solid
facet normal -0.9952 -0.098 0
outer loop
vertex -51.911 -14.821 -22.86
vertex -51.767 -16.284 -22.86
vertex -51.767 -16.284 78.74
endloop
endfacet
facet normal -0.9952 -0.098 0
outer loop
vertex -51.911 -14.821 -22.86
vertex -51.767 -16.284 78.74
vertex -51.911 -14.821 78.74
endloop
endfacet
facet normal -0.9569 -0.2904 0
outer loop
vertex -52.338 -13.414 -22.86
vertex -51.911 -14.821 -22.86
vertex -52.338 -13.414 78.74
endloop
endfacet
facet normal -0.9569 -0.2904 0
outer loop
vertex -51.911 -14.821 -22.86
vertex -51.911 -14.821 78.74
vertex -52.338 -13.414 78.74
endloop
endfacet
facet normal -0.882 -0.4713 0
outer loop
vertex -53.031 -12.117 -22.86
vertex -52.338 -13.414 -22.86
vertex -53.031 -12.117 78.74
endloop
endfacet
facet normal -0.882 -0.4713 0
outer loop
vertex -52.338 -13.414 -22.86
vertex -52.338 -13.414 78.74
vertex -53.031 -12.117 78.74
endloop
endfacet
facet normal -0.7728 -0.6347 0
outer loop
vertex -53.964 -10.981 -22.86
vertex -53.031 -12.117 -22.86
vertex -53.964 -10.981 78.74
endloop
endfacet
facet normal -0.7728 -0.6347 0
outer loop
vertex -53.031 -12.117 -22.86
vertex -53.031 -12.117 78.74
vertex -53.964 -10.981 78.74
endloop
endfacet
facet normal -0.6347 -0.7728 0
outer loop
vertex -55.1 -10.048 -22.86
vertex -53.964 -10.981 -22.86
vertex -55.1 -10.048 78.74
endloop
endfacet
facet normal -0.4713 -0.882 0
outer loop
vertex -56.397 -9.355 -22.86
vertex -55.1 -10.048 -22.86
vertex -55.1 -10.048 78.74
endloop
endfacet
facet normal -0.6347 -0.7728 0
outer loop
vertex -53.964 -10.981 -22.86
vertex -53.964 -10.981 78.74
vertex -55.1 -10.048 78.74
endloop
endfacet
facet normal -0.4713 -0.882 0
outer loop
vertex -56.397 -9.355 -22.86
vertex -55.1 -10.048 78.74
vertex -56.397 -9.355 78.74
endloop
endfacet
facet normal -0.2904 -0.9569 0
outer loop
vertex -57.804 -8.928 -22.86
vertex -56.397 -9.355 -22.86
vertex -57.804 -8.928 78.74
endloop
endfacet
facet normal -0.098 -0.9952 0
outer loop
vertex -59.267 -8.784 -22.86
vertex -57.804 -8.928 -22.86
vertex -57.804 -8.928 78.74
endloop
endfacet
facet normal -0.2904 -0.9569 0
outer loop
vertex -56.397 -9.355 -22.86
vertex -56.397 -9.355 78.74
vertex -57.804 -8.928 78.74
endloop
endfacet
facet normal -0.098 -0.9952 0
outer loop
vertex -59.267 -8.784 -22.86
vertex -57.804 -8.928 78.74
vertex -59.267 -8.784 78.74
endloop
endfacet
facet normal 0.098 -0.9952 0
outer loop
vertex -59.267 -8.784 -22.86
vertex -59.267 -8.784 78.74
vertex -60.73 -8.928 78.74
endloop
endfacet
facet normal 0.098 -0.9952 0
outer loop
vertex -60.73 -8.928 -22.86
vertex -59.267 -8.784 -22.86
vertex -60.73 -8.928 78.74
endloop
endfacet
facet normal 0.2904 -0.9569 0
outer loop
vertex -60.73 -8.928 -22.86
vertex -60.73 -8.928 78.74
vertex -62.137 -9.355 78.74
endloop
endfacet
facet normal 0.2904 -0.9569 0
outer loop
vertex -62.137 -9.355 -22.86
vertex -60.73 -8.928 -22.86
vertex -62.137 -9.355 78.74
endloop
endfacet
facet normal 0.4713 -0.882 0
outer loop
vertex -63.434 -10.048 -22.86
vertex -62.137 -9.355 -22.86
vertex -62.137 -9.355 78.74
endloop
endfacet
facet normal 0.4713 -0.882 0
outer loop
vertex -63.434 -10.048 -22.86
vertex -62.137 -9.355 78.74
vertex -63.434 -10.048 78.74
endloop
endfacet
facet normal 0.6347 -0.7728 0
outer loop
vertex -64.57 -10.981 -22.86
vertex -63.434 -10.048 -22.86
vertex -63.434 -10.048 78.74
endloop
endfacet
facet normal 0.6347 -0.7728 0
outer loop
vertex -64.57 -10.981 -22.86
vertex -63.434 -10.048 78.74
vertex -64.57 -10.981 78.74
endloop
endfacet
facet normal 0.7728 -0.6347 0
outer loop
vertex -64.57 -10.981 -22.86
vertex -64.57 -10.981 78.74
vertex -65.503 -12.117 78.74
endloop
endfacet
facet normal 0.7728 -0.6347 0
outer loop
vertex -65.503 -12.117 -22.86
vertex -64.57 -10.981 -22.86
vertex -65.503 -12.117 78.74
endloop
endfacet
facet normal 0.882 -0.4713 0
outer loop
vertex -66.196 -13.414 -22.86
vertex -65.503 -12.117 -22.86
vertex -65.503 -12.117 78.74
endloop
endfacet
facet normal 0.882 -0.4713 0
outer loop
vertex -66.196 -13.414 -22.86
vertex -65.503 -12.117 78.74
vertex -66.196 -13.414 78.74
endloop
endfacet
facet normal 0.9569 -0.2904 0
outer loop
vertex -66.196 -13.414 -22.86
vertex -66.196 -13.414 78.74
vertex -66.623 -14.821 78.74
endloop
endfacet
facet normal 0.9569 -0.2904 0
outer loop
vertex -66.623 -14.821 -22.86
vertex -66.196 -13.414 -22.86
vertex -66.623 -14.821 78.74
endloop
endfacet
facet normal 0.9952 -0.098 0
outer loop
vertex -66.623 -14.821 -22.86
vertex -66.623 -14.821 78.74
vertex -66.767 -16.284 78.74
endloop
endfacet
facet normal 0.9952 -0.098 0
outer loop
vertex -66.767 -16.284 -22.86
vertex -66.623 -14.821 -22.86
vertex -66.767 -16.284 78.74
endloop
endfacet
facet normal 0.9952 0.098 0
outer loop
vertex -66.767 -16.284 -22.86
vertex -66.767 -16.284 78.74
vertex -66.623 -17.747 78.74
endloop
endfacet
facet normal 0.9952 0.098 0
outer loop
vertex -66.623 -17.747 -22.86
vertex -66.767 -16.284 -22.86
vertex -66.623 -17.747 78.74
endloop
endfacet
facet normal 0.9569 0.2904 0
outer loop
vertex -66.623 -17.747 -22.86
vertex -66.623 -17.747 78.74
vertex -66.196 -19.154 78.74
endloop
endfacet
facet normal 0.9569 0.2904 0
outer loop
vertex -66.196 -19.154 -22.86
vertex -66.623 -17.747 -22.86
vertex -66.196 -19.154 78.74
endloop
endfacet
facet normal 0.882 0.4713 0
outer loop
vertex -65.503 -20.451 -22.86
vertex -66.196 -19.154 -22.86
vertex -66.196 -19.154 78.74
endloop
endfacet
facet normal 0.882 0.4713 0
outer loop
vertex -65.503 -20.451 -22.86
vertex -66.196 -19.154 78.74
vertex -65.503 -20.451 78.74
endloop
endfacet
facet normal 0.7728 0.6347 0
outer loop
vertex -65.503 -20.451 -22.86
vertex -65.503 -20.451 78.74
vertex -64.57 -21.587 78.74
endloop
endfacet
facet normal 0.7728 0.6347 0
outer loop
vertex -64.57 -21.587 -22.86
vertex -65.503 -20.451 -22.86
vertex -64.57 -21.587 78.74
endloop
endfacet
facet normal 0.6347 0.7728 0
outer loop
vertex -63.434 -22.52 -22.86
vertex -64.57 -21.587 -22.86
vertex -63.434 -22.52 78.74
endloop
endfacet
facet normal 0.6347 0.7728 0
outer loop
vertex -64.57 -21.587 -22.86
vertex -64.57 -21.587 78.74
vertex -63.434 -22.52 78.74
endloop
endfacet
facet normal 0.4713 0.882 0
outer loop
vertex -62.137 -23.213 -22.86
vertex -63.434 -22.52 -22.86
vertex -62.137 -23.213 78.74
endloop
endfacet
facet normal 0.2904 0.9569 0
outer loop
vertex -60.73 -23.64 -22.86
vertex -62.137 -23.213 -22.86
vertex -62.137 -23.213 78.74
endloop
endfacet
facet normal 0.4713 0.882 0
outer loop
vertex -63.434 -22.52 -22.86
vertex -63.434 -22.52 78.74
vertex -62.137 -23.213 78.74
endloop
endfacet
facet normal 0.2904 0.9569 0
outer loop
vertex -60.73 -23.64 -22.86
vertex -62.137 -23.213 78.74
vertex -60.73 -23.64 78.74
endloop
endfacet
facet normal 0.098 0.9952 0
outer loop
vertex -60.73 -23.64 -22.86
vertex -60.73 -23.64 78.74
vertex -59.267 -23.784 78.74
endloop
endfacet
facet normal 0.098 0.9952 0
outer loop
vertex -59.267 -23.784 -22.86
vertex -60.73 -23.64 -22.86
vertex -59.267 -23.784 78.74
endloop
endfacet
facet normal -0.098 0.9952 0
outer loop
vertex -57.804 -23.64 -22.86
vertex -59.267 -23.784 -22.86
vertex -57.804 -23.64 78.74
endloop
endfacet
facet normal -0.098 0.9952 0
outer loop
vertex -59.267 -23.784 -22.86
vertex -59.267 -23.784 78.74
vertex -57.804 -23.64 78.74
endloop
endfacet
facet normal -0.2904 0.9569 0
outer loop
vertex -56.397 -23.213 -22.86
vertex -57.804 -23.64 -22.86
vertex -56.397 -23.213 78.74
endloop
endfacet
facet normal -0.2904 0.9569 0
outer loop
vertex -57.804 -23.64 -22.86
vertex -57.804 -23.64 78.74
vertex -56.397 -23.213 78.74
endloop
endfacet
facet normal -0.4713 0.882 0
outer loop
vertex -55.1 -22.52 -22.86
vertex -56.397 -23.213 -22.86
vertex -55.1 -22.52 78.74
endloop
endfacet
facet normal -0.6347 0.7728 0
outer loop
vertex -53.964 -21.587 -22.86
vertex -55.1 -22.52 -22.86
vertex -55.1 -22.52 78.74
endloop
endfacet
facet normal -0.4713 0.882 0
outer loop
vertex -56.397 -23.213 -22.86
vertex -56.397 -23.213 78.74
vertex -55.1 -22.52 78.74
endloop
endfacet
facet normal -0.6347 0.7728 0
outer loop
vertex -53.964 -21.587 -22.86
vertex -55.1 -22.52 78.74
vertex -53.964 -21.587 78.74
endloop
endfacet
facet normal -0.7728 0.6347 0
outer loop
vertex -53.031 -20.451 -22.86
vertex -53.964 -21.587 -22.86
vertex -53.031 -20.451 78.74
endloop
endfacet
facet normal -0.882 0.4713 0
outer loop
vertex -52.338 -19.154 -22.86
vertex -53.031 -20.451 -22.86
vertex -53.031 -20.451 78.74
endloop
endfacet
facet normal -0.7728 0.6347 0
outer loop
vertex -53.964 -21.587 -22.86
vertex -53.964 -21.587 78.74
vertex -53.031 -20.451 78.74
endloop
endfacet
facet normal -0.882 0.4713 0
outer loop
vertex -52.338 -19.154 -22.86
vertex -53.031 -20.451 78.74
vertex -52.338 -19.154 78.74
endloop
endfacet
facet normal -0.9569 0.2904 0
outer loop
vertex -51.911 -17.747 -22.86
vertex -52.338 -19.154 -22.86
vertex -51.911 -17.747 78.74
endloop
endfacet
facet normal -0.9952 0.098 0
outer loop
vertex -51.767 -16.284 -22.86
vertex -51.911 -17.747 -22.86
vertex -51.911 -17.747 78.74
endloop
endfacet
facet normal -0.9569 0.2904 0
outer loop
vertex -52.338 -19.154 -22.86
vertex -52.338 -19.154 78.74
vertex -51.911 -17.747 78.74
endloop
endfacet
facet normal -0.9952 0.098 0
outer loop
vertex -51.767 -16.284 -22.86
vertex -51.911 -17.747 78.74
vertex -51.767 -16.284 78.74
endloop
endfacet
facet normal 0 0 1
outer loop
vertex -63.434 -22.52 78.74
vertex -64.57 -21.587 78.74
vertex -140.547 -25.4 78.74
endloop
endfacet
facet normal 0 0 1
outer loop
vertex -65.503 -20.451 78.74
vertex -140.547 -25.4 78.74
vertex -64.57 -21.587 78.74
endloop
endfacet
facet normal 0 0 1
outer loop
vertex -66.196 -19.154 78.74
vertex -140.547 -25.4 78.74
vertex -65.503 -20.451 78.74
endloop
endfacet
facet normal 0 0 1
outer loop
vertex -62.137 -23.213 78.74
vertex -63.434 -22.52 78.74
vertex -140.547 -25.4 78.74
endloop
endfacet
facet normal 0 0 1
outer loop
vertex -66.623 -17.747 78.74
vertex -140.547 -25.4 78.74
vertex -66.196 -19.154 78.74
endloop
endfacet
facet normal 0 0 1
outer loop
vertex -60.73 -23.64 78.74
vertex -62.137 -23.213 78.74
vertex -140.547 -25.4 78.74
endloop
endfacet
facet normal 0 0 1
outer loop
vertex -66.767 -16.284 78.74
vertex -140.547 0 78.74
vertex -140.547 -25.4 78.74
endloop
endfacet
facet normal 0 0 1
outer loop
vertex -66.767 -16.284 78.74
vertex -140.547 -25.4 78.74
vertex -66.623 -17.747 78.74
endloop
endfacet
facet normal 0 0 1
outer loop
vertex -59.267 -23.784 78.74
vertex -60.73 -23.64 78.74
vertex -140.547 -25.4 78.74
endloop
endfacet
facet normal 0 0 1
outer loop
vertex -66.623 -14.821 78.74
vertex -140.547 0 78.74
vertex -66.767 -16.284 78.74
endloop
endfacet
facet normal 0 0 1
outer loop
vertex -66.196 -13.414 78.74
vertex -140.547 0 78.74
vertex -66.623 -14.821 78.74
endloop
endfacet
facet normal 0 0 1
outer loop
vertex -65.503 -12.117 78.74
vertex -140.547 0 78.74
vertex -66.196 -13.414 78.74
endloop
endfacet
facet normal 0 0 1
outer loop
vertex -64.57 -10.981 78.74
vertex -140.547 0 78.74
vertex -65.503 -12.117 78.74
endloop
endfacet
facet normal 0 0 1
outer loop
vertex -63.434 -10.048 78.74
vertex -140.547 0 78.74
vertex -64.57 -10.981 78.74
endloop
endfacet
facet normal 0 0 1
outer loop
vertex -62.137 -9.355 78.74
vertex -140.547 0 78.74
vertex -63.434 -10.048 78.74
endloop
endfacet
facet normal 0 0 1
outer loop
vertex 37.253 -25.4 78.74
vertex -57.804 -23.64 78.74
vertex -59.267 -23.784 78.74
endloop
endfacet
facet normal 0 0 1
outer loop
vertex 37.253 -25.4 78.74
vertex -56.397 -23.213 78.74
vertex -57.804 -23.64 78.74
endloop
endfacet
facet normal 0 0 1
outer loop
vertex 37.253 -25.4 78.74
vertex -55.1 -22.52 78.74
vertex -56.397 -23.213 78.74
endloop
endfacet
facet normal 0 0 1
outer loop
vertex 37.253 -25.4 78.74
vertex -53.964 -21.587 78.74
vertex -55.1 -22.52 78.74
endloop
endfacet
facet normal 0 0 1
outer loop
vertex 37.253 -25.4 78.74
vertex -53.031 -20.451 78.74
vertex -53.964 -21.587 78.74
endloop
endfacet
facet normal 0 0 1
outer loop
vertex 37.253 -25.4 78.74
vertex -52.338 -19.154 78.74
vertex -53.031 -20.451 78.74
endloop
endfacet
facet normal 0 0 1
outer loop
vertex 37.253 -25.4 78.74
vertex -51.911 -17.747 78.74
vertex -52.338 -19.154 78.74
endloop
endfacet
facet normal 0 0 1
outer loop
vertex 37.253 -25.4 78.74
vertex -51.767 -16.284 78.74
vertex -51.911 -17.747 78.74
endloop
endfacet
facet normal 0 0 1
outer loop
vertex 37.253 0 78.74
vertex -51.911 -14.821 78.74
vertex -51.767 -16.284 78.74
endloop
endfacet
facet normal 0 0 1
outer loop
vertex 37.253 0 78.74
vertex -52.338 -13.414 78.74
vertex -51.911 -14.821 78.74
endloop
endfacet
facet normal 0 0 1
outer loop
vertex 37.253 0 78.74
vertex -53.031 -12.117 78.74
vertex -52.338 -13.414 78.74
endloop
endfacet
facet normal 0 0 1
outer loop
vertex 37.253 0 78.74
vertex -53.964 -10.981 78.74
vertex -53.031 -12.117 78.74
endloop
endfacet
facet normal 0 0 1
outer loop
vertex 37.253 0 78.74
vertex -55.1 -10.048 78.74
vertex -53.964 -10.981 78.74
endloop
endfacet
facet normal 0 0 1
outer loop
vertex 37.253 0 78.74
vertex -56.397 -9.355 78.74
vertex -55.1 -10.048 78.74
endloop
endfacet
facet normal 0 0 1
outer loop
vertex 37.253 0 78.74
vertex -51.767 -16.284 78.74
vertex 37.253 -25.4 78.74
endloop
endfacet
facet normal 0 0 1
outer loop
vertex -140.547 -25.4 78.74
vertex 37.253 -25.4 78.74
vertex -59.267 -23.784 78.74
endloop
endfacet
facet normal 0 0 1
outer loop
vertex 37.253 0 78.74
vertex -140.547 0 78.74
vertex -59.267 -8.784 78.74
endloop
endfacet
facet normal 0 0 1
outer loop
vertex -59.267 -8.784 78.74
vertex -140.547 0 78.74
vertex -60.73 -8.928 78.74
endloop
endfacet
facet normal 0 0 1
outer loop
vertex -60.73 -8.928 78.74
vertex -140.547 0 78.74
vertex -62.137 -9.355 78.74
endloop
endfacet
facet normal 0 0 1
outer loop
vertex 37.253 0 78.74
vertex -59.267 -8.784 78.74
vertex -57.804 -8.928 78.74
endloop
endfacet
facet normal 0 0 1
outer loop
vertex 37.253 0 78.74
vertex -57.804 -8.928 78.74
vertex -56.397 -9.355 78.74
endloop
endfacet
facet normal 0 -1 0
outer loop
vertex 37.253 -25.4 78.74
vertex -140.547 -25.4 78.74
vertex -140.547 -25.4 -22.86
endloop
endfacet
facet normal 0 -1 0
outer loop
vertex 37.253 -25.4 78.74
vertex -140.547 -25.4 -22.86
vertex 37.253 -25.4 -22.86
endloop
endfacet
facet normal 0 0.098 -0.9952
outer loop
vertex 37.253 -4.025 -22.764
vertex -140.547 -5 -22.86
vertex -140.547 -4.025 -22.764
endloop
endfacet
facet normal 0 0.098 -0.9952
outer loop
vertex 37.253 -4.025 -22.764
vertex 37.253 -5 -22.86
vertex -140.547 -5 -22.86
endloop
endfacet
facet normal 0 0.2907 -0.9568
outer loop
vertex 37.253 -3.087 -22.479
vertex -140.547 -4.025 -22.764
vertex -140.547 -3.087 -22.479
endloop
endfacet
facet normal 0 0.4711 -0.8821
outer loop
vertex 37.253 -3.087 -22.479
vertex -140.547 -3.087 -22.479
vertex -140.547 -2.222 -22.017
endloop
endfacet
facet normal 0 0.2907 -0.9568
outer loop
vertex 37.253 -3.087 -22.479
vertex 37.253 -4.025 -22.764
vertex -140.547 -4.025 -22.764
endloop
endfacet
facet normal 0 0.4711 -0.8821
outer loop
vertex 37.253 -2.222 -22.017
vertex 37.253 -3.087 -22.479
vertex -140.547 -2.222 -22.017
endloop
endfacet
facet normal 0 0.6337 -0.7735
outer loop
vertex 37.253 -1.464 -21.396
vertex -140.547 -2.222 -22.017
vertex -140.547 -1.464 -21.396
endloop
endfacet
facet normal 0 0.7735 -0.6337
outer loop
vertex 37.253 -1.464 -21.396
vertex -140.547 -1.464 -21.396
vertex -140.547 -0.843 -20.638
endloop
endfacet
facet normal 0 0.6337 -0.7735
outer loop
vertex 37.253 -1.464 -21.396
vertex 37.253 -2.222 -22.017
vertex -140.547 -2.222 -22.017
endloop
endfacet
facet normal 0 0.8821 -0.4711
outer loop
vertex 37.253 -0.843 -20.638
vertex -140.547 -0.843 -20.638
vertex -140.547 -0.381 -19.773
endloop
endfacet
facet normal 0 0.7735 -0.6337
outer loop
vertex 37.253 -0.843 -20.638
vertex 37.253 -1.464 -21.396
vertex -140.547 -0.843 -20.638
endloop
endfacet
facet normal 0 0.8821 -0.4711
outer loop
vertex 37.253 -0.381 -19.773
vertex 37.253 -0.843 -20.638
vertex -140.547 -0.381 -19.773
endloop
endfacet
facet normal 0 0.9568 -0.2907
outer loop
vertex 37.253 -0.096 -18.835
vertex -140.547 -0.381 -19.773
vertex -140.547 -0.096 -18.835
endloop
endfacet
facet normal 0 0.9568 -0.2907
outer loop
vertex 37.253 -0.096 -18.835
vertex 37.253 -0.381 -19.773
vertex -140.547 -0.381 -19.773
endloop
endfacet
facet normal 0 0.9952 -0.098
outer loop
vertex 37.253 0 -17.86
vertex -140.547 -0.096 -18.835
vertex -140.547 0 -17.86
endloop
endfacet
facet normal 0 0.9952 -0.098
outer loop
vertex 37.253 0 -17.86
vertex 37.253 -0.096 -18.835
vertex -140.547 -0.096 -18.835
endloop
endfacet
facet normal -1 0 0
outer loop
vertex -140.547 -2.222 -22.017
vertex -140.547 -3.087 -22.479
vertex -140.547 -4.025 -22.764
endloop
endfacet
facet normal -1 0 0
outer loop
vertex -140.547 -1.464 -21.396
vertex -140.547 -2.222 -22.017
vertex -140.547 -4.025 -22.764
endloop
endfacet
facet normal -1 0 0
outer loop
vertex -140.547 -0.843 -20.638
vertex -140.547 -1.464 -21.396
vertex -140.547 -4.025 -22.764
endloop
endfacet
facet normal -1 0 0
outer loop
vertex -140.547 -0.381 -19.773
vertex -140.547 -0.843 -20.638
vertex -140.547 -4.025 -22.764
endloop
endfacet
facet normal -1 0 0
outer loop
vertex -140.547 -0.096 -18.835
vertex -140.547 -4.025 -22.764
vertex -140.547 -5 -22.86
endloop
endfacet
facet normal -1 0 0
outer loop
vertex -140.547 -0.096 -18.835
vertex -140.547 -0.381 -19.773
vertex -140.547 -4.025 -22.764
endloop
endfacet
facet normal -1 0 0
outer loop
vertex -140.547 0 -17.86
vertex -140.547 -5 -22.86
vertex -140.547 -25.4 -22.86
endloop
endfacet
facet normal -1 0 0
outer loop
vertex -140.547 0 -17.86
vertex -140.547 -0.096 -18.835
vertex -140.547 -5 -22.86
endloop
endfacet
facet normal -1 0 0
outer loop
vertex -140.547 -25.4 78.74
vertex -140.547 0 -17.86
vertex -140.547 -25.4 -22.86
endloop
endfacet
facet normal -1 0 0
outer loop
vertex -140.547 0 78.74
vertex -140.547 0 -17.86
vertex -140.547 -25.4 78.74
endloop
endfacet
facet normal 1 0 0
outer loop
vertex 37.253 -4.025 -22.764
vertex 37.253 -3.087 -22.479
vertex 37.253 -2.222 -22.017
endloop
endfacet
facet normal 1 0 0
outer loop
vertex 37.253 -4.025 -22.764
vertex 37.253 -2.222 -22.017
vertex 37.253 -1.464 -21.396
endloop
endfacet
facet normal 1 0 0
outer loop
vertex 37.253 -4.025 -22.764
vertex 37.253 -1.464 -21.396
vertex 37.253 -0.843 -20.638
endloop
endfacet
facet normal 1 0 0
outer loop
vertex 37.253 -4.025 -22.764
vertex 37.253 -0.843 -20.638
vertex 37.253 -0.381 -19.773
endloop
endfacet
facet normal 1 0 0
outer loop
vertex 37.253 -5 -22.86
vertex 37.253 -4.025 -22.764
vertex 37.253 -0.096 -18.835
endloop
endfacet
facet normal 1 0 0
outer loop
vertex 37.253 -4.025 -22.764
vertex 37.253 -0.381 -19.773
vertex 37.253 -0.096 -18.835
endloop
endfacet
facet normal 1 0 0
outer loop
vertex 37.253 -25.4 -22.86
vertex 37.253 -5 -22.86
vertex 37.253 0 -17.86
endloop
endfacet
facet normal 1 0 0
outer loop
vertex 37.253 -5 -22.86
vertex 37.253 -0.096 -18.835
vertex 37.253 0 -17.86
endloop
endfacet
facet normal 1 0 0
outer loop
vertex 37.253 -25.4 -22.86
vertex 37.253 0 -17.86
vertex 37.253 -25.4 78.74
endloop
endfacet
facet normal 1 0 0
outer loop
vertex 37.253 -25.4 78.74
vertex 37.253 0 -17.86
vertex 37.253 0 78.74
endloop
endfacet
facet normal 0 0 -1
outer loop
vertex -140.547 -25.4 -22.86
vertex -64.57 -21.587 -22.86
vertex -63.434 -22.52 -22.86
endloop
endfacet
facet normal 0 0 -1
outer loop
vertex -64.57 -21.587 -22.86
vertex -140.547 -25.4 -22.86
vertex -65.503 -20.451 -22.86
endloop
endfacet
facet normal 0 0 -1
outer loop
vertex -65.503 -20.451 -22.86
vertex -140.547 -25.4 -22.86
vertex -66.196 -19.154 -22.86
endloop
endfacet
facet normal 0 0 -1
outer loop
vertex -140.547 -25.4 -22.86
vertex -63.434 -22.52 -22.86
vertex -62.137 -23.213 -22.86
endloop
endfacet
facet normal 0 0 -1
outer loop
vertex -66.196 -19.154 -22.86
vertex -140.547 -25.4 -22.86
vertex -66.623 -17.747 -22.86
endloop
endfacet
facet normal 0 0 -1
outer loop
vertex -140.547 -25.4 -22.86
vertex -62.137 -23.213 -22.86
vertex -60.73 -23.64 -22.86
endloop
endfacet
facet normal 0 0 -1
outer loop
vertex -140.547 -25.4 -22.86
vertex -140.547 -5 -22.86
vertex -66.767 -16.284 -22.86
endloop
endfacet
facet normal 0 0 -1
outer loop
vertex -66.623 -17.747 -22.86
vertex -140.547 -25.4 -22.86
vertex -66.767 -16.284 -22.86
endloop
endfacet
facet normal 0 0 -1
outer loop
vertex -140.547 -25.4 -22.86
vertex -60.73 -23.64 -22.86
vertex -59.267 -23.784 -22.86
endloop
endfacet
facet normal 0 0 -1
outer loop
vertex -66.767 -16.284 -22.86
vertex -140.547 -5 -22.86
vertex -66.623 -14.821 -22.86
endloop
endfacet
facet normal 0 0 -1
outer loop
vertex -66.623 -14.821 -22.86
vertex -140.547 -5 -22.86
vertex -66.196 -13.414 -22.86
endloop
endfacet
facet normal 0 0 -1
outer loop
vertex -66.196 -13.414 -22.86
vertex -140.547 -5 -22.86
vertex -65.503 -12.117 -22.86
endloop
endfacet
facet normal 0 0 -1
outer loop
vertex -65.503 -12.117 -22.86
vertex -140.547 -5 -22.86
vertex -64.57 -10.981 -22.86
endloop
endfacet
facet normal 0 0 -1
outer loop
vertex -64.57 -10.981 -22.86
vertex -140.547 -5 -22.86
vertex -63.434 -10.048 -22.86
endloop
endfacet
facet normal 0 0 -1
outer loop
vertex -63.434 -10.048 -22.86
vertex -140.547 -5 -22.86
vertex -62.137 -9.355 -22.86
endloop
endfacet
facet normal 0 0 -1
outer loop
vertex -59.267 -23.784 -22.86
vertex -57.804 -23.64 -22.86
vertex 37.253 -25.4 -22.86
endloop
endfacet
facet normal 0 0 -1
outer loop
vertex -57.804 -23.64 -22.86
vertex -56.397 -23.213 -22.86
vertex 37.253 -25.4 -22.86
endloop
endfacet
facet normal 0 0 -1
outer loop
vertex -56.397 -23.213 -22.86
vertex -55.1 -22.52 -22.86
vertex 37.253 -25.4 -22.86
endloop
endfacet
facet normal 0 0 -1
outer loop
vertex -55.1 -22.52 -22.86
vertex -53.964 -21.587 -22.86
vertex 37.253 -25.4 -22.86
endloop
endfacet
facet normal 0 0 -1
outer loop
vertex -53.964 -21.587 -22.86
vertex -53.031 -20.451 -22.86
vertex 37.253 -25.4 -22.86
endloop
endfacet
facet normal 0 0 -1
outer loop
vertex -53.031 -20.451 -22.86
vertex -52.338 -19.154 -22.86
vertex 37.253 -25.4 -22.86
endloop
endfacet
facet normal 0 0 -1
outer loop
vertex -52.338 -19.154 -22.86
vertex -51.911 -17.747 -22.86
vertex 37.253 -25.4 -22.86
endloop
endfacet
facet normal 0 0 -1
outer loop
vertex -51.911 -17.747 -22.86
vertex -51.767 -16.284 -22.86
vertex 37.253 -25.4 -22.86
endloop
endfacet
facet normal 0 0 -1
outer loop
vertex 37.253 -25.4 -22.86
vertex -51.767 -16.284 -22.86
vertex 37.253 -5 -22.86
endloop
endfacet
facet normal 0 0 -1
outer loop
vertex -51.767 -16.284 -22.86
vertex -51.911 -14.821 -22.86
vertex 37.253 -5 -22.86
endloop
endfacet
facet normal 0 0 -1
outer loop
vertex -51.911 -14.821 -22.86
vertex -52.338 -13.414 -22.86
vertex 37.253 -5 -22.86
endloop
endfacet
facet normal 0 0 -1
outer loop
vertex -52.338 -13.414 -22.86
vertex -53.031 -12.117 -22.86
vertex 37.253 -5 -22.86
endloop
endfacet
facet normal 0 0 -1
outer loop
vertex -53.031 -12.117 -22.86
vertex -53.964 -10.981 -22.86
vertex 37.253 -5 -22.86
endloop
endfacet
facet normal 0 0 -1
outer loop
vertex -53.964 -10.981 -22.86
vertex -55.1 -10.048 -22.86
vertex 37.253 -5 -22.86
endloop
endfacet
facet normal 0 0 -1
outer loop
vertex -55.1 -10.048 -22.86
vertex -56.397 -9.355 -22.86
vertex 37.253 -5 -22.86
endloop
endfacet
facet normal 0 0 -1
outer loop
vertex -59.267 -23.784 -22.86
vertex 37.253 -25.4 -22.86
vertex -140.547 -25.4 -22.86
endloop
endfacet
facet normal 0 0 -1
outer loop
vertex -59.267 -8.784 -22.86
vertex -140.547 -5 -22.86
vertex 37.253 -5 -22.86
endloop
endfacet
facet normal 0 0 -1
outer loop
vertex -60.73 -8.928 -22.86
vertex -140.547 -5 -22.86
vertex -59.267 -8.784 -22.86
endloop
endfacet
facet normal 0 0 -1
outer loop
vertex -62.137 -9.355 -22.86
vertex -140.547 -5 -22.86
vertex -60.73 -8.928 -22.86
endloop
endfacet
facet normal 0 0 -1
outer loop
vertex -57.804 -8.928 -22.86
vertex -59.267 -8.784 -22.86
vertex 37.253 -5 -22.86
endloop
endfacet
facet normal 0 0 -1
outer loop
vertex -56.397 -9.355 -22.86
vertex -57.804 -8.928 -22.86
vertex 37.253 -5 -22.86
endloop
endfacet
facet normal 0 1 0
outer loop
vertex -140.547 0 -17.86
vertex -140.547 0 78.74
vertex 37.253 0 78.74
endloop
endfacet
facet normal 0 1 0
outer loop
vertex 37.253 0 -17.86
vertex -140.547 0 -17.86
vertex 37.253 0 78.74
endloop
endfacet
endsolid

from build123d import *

# Parameters (mm, degrees)
F0_W     = 177.8
F0_H     = 101.6
F1_DEPTH = 25.4
F2_R     = 7.5
F3_DEPTH = 150
F4_R     = 5


with BuildPart() as f1:
    # F0 (on Front) → F1 (new body)
    with BuildSketch(Plane.XZ):
        with Locations((-51.646665, 27.939998)):
            Rectangle(F0_W, F0_H)
    extrude(amount=F1_DEPTH)

    # F2 (on face) → F3 (cut)
    with BuildSketch(Plane.XY.offset(78.739998)):
        with Locations((-59.266985, -16.284161)):
            Circle(F2_R)
    extrude(amount=-F3_DEPTH, mode=Mode.SUBTRACT)

    # F4
    f4_edges = [f1.edges().sort_by_distance(p)[0] for p in [
        (-51.646665, 0, -22.860002),
    ]]
    fillet(f4_edges, radius=F4_R)


solid = f1.part
